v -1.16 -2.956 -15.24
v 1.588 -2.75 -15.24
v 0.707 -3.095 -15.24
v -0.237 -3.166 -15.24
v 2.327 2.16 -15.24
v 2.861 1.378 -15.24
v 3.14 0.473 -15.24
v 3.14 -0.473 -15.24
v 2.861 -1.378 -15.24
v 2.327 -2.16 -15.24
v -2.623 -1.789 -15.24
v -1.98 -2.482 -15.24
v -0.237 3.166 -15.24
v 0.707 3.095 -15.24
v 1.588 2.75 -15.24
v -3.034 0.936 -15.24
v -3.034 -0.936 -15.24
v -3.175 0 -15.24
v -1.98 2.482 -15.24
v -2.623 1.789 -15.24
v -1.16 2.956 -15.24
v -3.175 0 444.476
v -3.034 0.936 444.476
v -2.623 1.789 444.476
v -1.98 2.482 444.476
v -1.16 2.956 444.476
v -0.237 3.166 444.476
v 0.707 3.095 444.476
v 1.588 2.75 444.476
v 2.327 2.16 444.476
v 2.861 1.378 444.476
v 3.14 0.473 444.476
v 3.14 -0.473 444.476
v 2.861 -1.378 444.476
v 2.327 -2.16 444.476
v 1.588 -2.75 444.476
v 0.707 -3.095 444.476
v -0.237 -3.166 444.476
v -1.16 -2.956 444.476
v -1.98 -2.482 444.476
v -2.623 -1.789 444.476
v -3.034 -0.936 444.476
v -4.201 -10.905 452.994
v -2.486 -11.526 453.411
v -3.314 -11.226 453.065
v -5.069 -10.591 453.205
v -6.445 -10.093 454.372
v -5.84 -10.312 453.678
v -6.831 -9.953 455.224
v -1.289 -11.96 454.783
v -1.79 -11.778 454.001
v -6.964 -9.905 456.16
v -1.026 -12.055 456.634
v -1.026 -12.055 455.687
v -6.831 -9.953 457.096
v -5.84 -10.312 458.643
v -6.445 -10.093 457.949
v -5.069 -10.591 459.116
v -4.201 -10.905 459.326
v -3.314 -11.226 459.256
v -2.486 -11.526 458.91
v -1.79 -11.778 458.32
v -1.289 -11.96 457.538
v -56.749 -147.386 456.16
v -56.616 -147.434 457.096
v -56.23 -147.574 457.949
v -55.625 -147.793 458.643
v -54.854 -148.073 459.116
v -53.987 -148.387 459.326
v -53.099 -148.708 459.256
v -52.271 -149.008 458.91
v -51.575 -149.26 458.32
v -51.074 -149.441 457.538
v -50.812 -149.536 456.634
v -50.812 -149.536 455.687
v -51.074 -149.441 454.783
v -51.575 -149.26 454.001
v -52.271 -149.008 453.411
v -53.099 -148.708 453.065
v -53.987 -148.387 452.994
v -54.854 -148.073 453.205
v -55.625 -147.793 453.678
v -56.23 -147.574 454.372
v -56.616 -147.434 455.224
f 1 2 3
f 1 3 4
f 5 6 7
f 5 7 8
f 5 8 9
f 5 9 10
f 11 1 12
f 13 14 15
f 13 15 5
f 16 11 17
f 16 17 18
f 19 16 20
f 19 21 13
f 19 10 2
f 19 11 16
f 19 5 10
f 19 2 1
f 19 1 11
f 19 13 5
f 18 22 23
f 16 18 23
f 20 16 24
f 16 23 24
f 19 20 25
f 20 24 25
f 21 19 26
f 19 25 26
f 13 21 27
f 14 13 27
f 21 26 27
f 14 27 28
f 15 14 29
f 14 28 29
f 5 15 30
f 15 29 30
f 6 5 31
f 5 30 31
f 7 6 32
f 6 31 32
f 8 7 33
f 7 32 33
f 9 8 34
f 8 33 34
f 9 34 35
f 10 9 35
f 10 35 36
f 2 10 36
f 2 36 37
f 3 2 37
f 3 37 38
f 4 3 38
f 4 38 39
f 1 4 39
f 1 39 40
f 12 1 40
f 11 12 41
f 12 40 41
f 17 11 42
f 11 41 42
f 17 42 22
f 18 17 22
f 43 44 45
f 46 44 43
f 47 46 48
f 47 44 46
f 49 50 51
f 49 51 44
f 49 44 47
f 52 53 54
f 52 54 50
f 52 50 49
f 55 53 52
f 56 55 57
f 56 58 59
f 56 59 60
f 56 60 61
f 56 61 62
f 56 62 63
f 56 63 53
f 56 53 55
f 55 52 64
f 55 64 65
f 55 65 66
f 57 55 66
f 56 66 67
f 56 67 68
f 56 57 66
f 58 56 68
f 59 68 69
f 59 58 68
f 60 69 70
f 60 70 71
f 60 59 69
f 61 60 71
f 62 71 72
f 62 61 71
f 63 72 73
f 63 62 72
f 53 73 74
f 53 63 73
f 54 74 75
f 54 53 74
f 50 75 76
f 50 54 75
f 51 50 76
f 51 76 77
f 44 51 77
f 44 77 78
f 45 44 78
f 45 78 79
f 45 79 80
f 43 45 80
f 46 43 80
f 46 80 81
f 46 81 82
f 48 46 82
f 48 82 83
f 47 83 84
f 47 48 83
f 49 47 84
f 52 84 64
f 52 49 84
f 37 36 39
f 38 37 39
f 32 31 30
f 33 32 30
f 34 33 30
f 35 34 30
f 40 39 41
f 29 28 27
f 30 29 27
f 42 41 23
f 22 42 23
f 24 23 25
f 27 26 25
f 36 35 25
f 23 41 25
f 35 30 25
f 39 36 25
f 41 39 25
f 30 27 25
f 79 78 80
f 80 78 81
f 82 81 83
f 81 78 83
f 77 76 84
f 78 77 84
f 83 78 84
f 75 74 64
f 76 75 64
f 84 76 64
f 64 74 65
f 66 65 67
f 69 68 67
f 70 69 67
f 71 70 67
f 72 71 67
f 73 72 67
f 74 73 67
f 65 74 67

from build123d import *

# Parameters (mm, degrees)
BOSS_EXTRUDE1_START     = -459.716294764
BOSS_EXTRUDE1_OUTLINE_R = 3.175
BOSS_EXTRUDE1_DEPTH     = 459.716294764
SKETCH3_R               = 3.175
BOSS_EXTRUDE2_DEPTH     = 146.218301515


# Read off the part's stored shape, not the designer's step: Boss-Extrude1
with BuildPart() as part:
    # Boss-Extrude1 outline → Boss-Extrude1 (new body)
    with BuildSketch(Plane(origin=(0, 0, -15.24), x_dir=(-1, 0, 0), z_dir=(0, 0, -1)).offset(BOSS_EXTRUDE1_START)):
        Circle(BOSS_EXTRUDE1_OUTLINE_R)
    extrude(amount=BOSS_EXTRUDE1_DEPTH)


with BuildPart() as body_2:
    # Sketch3 → Boss-Extrude2 (new body)
    with BuildSketch(Plane(origin=(-3.978254652, -10.985870285, 0), x_dir=(0.9402490829575615, -0.3404873888963652, 0), z_dir=(0.3404873888963652, 0.9402490829575615, 4.8254138608759004e-15))):
        with Locations(Location((0, -456.160294764, 0), (0, 0, 180))):
            Circle(SKETCH3_R)
    extrude(amount=-BOSS_EXTRUDE2_DEPTH)


solid = Compound([part.part, body_2.part])
